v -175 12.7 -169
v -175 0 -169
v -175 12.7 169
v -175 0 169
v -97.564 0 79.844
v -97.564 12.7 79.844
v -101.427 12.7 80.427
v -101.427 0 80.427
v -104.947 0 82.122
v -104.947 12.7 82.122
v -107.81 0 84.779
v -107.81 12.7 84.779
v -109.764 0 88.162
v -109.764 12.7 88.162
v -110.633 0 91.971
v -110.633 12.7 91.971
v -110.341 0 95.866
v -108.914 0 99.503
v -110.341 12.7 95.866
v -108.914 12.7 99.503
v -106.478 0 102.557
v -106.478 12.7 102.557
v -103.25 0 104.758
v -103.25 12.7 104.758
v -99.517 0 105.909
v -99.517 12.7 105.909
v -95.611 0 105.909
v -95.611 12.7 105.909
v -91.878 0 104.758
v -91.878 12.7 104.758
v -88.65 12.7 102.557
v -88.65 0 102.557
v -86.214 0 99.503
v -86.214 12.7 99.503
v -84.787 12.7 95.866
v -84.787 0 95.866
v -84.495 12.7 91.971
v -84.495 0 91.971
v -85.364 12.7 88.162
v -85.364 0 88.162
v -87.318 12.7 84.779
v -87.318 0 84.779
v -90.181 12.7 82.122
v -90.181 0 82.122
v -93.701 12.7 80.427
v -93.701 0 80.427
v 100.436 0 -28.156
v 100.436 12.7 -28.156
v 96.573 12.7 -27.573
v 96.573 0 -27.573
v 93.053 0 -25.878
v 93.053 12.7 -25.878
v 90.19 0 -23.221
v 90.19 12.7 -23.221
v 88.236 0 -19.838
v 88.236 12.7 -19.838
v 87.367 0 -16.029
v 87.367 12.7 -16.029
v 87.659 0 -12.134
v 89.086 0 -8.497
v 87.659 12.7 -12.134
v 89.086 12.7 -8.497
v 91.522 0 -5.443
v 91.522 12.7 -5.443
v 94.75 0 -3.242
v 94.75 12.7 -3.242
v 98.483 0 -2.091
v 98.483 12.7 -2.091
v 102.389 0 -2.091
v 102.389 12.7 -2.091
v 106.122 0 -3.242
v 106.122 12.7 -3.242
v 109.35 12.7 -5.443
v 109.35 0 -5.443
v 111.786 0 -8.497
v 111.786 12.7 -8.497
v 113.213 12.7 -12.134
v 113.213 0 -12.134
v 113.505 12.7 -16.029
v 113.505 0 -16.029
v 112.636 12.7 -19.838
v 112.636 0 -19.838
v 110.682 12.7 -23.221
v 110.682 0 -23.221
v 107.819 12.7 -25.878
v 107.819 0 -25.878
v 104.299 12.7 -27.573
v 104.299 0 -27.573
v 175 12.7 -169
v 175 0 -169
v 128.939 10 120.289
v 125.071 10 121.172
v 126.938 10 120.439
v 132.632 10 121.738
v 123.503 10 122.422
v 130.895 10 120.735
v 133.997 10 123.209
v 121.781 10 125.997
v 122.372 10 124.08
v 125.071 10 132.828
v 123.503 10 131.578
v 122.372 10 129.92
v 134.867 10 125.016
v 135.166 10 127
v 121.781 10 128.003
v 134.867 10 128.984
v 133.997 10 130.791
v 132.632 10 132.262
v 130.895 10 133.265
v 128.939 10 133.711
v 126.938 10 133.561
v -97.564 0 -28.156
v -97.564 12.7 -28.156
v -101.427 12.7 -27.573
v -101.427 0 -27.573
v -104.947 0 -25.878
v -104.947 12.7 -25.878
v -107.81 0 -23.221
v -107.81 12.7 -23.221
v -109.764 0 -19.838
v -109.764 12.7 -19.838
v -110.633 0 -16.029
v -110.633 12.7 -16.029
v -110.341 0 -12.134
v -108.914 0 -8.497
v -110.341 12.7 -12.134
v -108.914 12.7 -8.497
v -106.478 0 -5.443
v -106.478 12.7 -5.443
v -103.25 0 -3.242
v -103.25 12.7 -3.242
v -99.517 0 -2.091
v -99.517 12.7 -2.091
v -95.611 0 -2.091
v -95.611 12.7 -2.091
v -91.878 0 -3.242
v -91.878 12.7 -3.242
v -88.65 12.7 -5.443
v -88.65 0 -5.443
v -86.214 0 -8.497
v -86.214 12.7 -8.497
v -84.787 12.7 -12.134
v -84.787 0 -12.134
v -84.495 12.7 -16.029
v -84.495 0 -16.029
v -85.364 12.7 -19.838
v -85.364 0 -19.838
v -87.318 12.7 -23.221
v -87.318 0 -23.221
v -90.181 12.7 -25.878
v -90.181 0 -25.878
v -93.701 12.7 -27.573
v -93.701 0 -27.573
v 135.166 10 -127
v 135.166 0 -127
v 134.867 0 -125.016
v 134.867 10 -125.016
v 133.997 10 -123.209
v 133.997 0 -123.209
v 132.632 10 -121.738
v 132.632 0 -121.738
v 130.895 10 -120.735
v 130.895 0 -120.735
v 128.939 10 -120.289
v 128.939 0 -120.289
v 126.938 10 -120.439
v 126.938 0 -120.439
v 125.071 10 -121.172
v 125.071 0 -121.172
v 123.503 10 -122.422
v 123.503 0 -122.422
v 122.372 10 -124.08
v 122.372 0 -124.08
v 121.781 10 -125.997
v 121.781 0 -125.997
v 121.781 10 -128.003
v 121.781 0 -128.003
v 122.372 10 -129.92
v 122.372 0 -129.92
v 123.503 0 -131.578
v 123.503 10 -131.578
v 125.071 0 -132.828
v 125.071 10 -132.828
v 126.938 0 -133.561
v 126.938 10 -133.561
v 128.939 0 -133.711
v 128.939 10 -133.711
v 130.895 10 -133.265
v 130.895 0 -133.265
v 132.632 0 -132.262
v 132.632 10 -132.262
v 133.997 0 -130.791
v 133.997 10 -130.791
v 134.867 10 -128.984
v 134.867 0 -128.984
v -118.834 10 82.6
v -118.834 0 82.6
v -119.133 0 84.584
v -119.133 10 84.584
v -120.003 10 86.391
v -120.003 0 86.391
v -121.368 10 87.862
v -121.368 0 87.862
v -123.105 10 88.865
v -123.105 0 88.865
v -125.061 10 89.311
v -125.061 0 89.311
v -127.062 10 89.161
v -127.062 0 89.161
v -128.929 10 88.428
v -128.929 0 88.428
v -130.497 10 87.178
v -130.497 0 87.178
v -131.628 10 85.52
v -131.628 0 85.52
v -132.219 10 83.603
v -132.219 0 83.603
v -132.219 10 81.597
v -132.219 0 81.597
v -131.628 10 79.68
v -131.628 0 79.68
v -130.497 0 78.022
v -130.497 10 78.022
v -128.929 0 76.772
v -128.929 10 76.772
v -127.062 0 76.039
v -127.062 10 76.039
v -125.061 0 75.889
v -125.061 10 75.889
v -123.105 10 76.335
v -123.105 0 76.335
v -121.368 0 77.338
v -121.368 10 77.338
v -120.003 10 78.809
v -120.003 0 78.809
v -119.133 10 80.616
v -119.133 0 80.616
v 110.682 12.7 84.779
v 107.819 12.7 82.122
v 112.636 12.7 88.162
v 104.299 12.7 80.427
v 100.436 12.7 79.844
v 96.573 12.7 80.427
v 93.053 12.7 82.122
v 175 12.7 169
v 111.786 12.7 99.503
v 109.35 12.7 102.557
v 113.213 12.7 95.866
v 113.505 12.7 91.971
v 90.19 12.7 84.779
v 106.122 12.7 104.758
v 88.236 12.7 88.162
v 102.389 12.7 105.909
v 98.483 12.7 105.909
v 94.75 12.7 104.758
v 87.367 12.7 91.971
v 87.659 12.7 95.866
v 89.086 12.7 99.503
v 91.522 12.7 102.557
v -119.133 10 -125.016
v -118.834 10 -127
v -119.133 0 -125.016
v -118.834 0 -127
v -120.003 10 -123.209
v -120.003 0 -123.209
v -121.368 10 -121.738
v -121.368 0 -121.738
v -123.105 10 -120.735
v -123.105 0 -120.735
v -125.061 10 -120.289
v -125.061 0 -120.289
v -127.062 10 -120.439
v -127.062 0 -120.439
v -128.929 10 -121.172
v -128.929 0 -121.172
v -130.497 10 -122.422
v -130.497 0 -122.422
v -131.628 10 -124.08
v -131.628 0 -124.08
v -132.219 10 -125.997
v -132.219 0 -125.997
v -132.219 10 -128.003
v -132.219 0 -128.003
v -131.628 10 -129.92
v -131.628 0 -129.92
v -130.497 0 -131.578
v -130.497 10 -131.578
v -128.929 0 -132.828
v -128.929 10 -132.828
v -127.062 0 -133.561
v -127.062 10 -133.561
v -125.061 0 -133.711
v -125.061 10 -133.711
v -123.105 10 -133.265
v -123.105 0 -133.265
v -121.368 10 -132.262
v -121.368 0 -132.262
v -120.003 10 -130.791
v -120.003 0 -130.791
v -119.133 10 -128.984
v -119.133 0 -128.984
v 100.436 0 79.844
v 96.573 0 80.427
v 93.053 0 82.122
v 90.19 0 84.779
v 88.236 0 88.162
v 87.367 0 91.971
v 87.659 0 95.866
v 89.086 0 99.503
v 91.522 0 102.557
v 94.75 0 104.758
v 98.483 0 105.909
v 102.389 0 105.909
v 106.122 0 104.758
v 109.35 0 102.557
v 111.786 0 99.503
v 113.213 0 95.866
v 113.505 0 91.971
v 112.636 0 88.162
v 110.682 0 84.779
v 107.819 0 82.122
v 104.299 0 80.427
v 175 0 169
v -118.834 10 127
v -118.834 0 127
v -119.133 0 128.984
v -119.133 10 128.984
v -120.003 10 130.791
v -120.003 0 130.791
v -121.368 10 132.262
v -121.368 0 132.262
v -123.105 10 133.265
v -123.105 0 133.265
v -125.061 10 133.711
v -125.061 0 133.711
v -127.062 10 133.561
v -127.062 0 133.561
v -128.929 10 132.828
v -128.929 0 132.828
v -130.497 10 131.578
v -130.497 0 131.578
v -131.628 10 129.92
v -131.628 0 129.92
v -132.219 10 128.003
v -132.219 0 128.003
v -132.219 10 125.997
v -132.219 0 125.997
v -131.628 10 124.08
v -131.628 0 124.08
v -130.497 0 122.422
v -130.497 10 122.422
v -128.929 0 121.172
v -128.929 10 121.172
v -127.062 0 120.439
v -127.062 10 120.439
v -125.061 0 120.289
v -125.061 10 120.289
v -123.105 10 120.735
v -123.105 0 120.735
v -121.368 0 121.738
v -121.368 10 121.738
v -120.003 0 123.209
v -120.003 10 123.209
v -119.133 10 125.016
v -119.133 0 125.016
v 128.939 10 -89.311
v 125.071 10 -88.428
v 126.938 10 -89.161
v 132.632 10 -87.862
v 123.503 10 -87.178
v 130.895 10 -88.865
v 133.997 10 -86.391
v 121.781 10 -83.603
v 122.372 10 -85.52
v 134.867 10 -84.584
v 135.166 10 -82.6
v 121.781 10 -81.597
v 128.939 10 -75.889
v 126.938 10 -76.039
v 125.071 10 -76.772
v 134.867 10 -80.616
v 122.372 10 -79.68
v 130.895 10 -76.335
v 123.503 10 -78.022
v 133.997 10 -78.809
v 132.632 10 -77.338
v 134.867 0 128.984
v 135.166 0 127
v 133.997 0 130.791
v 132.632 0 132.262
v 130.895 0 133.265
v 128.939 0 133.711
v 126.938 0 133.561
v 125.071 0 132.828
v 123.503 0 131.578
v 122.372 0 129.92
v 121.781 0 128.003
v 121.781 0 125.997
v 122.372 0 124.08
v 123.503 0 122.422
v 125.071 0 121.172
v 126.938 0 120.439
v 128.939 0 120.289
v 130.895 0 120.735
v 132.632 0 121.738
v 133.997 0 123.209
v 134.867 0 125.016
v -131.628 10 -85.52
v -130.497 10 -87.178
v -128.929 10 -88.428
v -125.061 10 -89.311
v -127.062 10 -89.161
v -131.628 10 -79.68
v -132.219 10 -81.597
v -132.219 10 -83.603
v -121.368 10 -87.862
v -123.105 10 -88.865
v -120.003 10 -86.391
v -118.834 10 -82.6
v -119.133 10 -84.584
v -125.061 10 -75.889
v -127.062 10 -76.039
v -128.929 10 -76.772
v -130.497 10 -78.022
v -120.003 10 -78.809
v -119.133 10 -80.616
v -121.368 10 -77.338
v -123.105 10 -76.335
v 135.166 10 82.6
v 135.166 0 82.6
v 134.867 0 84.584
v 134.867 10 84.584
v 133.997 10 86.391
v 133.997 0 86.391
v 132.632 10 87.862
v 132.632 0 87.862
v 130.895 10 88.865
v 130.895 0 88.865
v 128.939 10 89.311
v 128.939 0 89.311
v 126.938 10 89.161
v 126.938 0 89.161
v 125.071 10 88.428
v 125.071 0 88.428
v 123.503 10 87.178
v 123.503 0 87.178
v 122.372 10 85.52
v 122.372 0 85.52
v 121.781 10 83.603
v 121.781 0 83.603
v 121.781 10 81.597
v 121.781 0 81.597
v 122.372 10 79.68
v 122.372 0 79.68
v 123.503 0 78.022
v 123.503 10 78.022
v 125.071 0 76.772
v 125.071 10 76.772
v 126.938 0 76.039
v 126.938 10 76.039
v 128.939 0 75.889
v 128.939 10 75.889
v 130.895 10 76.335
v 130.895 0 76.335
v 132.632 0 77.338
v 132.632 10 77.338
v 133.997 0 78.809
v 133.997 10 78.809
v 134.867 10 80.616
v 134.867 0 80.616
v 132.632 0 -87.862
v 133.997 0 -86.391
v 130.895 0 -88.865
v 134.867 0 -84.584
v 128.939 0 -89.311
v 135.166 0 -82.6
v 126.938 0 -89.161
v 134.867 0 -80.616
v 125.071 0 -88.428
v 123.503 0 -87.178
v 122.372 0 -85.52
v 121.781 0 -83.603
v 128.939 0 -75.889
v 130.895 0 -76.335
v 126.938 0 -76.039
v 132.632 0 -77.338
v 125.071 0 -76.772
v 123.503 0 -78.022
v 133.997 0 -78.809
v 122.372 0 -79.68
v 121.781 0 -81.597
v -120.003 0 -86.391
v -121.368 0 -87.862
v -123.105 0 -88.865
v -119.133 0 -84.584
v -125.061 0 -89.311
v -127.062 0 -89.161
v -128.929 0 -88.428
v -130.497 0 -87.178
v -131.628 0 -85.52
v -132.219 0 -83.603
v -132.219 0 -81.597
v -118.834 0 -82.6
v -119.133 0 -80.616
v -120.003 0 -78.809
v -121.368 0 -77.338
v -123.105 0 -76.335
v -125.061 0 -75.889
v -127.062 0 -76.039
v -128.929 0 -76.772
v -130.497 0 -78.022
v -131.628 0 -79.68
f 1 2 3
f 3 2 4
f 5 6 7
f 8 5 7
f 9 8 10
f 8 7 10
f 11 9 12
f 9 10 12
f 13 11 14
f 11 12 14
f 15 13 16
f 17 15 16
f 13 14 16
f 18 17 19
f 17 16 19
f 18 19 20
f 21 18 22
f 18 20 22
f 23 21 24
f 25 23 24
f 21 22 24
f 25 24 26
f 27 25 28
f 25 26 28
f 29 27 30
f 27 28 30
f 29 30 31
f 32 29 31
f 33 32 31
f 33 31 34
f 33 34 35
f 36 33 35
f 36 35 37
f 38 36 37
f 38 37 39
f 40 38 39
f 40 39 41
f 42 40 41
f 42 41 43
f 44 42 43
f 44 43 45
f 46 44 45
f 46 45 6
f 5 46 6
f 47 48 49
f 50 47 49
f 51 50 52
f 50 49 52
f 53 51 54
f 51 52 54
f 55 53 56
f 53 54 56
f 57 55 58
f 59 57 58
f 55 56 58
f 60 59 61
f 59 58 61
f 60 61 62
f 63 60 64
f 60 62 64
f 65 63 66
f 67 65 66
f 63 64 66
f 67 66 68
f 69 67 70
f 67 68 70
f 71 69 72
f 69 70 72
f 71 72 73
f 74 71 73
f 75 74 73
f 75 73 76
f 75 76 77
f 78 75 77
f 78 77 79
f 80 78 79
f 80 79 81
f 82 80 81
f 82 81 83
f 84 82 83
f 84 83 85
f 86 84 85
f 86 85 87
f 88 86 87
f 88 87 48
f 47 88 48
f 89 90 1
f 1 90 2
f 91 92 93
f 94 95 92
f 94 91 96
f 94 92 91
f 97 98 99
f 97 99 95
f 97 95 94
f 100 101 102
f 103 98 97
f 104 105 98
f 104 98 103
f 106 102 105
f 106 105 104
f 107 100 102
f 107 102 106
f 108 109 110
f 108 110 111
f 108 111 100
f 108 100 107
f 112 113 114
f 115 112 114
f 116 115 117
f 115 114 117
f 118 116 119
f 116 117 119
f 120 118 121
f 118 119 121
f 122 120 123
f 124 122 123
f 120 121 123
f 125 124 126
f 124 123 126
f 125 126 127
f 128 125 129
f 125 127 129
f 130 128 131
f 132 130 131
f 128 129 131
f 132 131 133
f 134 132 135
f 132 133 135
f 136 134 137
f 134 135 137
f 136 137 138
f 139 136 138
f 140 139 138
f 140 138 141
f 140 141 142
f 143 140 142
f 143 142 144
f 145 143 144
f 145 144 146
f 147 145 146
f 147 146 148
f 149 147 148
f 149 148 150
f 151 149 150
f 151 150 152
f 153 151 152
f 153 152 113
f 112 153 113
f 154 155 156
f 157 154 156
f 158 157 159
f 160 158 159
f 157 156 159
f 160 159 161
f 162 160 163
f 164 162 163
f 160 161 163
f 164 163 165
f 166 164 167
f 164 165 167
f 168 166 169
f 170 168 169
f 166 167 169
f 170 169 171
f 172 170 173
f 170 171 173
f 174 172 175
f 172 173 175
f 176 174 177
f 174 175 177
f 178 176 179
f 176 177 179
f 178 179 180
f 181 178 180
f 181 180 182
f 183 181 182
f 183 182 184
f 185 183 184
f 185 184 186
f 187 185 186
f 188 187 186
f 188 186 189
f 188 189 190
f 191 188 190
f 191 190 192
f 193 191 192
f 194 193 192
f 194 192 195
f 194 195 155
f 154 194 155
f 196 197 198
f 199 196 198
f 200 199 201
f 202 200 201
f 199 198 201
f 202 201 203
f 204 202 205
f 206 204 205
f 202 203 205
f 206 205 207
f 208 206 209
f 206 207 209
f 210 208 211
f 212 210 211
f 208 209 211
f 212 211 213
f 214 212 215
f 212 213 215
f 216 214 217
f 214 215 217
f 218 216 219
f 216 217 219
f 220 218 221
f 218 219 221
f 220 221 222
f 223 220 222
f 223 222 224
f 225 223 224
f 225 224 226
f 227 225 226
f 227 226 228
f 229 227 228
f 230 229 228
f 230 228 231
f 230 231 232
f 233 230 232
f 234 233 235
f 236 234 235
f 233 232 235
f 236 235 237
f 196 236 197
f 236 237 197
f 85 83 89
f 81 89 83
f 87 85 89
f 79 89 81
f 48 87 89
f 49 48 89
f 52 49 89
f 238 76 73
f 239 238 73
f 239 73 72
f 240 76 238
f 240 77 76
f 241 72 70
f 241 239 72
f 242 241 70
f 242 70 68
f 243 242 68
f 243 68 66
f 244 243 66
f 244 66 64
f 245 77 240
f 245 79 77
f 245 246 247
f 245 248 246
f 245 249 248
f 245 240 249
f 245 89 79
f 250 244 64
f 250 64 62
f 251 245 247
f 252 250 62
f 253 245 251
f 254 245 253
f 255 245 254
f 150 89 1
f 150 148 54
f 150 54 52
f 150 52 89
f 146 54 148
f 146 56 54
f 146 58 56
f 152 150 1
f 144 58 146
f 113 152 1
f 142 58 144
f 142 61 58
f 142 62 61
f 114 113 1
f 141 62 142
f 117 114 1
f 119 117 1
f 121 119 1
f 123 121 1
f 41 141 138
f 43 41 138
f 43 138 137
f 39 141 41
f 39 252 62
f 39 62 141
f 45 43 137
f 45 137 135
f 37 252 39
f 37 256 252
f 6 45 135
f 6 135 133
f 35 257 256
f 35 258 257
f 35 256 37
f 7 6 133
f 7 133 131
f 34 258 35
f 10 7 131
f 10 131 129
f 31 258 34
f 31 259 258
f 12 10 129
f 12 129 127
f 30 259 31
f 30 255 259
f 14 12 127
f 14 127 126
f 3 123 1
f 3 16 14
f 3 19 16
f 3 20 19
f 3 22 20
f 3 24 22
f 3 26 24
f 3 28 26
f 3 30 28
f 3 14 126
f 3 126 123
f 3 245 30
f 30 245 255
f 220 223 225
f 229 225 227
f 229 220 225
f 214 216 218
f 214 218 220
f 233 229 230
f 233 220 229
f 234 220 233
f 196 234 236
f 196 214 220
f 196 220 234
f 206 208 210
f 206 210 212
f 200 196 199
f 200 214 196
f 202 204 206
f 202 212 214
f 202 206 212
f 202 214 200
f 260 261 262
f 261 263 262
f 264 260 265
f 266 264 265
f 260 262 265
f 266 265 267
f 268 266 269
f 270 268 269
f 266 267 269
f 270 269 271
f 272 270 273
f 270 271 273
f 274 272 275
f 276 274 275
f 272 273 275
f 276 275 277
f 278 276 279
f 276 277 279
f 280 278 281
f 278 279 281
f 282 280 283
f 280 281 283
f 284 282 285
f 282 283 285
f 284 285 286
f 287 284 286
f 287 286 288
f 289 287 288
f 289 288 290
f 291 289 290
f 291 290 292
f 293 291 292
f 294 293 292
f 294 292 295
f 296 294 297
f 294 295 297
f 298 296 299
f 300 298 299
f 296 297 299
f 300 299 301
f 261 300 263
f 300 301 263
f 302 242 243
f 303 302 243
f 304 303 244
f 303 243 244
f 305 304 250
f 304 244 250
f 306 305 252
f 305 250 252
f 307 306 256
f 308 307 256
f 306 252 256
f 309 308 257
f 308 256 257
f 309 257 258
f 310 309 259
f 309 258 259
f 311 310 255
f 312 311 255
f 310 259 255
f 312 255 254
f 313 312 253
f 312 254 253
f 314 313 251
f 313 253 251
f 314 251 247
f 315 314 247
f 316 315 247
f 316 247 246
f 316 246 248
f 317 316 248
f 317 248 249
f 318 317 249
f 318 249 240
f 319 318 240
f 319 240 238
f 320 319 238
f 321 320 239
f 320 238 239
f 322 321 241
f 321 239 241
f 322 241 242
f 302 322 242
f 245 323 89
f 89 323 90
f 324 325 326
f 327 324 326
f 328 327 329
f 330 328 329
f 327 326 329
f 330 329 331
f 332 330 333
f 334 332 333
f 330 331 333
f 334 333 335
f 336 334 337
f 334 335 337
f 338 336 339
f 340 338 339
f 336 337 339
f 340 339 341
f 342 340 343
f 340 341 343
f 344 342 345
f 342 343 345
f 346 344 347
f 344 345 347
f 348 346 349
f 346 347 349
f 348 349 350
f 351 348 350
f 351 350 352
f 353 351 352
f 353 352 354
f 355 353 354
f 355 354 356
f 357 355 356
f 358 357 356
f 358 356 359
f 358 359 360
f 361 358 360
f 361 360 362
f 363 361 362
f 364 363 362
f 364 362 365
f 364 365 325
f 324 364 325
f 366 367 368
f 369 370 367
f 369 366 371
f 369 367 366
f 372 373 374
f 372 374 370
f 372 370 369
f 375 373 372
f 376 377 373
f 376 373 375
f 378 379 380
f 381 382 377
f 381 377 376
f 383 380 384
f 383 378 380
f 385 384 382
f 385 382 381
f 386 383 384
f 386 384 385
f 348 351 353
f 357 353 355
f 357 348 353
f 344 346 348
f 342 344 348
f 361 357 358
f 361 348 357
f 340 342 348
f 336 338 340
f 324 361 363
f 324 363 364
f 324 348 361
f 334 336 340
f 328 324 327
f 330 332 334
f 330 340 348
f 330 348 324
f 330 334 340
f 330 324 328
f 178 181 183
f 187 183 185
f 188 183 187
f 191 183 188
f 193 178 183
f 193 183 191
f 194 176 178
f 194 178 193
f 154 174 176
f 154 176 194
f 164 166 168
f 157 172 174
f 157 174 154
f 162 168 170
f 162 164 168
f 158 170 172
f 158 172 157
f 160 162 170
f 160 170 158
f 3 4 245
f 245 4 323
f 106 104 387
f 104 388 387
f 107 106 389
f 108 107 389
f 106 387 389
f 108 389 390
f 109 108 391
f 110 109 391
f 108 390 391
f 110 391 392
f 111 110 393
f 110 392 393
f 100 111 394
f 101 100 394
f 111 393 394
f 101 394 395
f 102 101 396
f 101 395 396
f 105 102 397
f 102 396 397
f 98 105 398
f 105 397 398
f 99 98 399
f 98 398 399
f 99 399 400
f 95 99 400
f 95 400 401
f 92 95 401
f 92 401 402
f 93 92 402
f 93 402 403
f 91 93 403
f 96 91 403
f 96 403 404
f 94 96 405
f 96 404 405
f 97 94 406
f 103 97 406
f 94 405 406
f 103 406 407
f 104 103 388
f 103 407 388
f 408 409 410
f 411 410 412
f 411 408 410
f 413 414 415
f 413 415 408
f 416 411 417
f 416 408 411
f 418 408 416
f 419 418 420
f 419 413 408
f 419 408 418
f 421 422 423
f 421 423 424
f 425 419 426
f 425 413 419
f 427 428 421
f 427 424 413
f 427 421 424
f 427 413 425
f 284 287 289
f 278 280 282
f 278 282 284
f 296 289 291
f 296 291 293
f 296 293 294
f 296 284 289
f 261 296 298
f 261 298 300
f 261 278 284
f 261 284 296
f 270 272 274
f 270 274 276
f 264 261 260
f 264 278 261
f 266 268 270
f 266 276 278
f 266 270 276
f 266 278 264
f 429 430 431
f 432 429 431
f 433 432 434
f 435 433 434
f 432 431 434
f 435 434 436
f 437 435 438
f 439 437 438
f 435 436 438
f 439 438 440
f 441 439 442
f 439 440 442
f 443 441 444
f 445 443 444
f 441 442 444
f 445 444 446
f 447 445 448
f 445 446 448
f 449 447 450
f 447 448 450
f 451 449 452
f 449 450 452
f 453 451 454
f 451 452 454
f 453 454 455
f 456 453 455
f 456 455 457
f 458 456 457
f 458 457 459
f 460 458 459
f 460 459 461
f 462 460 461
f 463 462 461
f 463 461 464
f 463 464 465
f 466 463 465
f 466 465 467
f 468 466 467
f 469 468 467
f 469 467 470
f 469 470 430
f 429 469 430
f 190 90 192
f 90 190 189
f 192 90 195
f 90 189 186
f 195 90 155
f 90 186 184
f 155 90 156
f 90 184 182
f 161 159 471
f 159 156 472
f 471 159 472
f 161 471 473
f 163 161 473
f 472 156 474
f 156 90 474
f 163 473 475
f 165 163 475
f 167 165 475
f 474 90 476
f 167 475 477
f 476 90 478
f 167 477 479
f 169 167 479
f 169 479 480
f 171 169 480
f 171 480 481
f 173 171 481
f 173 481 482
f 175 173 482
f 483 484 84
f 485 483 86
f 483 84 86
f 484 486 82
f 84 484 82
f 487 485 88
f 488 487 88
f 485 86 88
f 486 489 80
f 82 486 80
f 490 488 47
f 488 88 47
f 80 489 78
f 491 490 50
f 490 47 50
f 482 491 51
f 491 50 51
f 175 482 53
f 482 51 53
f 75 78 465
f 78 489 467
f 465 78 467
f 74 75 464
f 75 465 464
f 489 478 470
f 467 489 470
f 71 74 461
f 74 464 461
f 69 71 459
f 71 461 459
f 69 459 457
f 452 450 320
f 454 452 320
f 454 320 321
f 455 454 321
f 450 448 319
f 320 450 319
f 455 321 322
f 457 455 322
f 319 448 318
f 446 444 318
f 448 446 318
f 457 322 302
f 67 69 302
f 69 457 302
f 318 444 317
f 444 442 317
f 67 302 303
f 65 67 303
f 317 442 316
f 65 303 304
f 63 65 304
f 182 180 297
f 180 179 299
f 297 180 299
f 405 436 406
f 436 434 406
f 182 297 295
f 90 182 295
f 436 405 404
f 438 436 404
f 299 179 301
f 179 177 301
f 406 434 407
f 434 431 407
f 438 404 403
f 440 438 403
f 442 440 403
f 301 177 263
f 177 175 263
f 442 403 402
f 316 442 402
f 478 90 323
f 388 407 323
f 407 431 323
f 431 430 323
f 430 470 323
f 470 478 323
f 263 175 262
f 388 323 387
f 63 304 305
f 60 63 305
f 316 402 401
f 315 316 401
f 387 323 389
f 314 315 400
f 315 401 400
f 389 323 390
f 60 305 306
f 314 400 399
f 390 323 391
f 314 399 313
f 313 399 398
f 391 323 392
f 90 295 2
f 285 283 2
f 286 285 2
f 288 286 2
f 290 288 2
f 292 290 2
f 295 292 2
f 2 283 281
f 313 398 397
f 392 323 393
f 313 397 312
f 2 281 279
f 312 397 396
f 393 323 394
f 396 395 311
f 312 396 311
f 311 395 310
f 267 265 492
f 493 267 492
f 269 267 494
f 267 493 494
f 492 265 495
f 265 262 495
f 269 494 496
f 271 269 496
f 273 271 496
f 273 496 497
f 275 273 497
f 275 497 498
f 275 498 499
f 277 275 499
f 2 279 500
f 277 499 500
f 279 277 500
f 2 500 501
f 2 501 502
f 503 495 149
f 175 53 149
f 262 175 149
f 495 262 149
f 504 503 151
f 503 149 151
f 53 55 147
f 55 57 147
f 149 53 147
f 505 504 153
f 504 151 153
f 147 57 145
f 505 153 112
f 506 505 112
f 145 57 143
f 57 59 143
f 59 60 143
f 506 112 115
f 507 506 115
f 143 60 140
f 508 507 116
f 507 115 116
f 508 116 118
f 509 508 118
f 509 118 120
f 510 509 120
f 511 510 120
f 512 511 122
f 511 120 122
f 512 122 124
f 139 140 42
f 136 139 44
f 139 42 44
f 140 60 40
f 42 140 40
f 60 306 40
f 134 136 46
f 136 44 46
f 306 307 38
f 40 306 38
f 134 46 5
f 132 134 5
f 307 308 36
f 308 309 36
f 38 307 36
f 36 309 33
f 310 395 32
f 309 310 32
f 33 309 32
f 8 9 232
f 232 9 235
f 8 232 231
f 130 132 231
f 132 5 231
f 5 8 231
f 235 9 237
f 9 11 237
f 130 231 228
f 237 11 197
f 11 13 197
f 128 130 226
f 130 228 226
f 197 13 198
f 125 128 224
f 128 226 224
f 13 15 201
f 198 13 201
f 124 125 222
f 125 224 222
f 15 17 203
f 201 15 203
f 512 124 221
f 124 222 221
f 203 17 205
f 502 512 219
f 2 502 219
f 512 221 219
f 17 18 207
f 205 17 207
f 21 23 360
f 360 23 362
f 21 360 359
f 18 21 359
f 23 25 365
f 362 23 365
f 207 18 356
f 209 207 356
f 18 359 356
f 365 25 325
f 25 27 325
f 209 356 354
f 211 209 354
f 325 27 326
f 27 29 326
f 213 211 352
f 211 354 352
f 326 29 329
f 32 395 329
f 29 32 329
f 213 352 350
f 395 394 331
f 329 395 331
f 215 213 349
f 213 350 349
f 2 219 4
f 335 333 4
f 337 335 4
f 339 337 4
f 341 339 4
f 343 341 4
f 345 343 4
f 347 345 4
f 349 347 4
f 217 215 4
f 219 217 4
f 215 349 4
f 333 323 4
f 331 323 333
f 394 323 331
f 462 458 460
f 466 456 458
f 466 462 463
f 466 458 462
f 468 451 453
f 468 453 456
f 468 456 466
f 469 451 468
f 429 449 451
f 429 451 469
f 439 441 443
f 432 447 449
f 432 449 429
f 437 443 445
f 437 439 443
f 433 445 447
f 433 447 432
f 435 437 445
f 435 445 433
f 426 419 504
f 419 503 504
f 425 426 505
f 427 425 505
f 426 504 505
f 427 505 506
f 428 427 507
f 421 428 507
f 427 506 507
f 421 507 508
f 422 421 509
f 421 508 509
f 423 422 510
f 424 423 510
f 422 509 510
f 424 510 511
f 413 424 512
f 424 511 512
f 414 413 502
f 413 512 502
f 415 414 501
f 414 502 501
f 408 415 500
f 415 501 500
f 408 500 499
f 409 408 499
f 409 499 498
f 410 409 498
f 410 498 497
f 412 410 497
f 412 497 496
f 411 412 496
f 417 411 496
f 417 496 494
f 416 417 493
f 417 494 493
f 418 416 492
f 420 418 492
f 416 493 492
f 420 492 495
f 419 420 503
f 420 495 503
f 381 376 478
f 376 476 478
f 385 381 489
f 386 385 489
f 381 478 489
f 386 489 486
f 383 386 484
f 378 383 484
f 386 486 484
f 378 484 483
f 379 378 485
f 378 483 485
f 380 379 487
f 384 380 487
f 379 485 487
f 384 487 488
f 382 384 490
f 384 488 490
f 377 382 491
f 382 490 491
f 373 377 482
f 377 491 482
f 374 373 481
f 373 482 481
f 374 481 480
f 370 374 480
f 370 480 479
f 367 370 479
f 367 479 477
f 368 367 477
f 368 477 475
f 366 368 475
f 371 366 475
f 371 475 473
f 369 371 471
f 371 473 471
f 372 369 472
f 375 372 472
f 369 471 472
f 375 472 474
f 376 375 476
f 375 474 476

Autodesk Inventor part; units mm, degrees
ref_plane "YZ Plane" through (0, 0, 0) normal (1, 0, 0) x (0, 1, 0)
ref_plane "XZ Plane" through (0, 0, 0) normal (0, 1, 0) x (-1, 0, 0)
ref_plane "XY Plane" through (0, 0, 0) normal (0, 0, 1) x (1, 0, 0)
sketch "Sketch1" plane through (0, 0, 0) normal (0, 1, 0) x (-1, 0, 0)
  line L0 (-175, -169) -> (175, -169)
  line L1 (175, -169) -> (175, 169)
  line L2 (175, 169) -> (-175, 169)
  line L3 (-175, 169) -> (-175, -169)
  line L4 (-175, -169) -> (175, 169) construction
  line L5 (175, -169) -> (-175, 169) construction
  point P0 (0, 0)
  dimension "d0" = 338
  dimension "d1" = 350
extrude "Extrusion1" add sketch "Sketch1" along normal blind 12.7
sketch "Sketch2" plane through (0, 0, 0) normal (0, -1, 0) x (1, 0, 0)
  circle A0 centre (-97.564, 92.95) radius 12 projected
  circle A1 centre (-97.564, -15.05) radius 12 projected
  circle A2 centre (-97.564, -15.05) radius 12 projected
  circle A3 centre (100.436, 92.95) radius 12 projected
  circle A4 centre (100.436, -15.05) radius 12 projected
  circle A5 centre (-125.564, 127) radius 6.73 projected
  circle A6 centre (-125.564, 82.6) radius 6.73 projected
  circle A7 centre (-125.564, -82.6) radius 6.73 projected
  circle A8 centre (-125.564, -127) radius 6.73 projected
  circle A9 centre (128.436, -127) radius 6.73 projected
  circle A10 centre (128.436, -82.6) radius 6.73 projected
  circle A11 centre (128.436, 82.6) radius 6.73 projected
  circle A12 centre (128.436, 127) radius 6.73 projected
  point P0 (0, 0)
extrude "Extrusion2" cut sketch "Sketch2" against normal blind 10
sketch "Sketch3" plane through (0, 0, 0) normal (0, -1, 0) x (1, 0, 0)
  circle A0 centre (-97.564, -15.05) radius 12 projected
  circle A1 centre (-97.564, 92.95) radius 12 projected
  circle A2 centre (100.436, -15.05) radius 12 projected
  circle A3 centre (100.436, 92.95) radius 12 projected
  point P0 (0, 0)
hole "Hole1" at (-97.564, 0, -15.05) at (-97.564, 0, 92.95) at (100.436, 0, -15.05) at (100.436, 0, 92.95) direction (0, 1, 0) diameter 26.211 depth 12.7 thread size "M30x3.5" class "6H" standard "ANSI Metric M Profile"
properties part number "PLACA BASE"
